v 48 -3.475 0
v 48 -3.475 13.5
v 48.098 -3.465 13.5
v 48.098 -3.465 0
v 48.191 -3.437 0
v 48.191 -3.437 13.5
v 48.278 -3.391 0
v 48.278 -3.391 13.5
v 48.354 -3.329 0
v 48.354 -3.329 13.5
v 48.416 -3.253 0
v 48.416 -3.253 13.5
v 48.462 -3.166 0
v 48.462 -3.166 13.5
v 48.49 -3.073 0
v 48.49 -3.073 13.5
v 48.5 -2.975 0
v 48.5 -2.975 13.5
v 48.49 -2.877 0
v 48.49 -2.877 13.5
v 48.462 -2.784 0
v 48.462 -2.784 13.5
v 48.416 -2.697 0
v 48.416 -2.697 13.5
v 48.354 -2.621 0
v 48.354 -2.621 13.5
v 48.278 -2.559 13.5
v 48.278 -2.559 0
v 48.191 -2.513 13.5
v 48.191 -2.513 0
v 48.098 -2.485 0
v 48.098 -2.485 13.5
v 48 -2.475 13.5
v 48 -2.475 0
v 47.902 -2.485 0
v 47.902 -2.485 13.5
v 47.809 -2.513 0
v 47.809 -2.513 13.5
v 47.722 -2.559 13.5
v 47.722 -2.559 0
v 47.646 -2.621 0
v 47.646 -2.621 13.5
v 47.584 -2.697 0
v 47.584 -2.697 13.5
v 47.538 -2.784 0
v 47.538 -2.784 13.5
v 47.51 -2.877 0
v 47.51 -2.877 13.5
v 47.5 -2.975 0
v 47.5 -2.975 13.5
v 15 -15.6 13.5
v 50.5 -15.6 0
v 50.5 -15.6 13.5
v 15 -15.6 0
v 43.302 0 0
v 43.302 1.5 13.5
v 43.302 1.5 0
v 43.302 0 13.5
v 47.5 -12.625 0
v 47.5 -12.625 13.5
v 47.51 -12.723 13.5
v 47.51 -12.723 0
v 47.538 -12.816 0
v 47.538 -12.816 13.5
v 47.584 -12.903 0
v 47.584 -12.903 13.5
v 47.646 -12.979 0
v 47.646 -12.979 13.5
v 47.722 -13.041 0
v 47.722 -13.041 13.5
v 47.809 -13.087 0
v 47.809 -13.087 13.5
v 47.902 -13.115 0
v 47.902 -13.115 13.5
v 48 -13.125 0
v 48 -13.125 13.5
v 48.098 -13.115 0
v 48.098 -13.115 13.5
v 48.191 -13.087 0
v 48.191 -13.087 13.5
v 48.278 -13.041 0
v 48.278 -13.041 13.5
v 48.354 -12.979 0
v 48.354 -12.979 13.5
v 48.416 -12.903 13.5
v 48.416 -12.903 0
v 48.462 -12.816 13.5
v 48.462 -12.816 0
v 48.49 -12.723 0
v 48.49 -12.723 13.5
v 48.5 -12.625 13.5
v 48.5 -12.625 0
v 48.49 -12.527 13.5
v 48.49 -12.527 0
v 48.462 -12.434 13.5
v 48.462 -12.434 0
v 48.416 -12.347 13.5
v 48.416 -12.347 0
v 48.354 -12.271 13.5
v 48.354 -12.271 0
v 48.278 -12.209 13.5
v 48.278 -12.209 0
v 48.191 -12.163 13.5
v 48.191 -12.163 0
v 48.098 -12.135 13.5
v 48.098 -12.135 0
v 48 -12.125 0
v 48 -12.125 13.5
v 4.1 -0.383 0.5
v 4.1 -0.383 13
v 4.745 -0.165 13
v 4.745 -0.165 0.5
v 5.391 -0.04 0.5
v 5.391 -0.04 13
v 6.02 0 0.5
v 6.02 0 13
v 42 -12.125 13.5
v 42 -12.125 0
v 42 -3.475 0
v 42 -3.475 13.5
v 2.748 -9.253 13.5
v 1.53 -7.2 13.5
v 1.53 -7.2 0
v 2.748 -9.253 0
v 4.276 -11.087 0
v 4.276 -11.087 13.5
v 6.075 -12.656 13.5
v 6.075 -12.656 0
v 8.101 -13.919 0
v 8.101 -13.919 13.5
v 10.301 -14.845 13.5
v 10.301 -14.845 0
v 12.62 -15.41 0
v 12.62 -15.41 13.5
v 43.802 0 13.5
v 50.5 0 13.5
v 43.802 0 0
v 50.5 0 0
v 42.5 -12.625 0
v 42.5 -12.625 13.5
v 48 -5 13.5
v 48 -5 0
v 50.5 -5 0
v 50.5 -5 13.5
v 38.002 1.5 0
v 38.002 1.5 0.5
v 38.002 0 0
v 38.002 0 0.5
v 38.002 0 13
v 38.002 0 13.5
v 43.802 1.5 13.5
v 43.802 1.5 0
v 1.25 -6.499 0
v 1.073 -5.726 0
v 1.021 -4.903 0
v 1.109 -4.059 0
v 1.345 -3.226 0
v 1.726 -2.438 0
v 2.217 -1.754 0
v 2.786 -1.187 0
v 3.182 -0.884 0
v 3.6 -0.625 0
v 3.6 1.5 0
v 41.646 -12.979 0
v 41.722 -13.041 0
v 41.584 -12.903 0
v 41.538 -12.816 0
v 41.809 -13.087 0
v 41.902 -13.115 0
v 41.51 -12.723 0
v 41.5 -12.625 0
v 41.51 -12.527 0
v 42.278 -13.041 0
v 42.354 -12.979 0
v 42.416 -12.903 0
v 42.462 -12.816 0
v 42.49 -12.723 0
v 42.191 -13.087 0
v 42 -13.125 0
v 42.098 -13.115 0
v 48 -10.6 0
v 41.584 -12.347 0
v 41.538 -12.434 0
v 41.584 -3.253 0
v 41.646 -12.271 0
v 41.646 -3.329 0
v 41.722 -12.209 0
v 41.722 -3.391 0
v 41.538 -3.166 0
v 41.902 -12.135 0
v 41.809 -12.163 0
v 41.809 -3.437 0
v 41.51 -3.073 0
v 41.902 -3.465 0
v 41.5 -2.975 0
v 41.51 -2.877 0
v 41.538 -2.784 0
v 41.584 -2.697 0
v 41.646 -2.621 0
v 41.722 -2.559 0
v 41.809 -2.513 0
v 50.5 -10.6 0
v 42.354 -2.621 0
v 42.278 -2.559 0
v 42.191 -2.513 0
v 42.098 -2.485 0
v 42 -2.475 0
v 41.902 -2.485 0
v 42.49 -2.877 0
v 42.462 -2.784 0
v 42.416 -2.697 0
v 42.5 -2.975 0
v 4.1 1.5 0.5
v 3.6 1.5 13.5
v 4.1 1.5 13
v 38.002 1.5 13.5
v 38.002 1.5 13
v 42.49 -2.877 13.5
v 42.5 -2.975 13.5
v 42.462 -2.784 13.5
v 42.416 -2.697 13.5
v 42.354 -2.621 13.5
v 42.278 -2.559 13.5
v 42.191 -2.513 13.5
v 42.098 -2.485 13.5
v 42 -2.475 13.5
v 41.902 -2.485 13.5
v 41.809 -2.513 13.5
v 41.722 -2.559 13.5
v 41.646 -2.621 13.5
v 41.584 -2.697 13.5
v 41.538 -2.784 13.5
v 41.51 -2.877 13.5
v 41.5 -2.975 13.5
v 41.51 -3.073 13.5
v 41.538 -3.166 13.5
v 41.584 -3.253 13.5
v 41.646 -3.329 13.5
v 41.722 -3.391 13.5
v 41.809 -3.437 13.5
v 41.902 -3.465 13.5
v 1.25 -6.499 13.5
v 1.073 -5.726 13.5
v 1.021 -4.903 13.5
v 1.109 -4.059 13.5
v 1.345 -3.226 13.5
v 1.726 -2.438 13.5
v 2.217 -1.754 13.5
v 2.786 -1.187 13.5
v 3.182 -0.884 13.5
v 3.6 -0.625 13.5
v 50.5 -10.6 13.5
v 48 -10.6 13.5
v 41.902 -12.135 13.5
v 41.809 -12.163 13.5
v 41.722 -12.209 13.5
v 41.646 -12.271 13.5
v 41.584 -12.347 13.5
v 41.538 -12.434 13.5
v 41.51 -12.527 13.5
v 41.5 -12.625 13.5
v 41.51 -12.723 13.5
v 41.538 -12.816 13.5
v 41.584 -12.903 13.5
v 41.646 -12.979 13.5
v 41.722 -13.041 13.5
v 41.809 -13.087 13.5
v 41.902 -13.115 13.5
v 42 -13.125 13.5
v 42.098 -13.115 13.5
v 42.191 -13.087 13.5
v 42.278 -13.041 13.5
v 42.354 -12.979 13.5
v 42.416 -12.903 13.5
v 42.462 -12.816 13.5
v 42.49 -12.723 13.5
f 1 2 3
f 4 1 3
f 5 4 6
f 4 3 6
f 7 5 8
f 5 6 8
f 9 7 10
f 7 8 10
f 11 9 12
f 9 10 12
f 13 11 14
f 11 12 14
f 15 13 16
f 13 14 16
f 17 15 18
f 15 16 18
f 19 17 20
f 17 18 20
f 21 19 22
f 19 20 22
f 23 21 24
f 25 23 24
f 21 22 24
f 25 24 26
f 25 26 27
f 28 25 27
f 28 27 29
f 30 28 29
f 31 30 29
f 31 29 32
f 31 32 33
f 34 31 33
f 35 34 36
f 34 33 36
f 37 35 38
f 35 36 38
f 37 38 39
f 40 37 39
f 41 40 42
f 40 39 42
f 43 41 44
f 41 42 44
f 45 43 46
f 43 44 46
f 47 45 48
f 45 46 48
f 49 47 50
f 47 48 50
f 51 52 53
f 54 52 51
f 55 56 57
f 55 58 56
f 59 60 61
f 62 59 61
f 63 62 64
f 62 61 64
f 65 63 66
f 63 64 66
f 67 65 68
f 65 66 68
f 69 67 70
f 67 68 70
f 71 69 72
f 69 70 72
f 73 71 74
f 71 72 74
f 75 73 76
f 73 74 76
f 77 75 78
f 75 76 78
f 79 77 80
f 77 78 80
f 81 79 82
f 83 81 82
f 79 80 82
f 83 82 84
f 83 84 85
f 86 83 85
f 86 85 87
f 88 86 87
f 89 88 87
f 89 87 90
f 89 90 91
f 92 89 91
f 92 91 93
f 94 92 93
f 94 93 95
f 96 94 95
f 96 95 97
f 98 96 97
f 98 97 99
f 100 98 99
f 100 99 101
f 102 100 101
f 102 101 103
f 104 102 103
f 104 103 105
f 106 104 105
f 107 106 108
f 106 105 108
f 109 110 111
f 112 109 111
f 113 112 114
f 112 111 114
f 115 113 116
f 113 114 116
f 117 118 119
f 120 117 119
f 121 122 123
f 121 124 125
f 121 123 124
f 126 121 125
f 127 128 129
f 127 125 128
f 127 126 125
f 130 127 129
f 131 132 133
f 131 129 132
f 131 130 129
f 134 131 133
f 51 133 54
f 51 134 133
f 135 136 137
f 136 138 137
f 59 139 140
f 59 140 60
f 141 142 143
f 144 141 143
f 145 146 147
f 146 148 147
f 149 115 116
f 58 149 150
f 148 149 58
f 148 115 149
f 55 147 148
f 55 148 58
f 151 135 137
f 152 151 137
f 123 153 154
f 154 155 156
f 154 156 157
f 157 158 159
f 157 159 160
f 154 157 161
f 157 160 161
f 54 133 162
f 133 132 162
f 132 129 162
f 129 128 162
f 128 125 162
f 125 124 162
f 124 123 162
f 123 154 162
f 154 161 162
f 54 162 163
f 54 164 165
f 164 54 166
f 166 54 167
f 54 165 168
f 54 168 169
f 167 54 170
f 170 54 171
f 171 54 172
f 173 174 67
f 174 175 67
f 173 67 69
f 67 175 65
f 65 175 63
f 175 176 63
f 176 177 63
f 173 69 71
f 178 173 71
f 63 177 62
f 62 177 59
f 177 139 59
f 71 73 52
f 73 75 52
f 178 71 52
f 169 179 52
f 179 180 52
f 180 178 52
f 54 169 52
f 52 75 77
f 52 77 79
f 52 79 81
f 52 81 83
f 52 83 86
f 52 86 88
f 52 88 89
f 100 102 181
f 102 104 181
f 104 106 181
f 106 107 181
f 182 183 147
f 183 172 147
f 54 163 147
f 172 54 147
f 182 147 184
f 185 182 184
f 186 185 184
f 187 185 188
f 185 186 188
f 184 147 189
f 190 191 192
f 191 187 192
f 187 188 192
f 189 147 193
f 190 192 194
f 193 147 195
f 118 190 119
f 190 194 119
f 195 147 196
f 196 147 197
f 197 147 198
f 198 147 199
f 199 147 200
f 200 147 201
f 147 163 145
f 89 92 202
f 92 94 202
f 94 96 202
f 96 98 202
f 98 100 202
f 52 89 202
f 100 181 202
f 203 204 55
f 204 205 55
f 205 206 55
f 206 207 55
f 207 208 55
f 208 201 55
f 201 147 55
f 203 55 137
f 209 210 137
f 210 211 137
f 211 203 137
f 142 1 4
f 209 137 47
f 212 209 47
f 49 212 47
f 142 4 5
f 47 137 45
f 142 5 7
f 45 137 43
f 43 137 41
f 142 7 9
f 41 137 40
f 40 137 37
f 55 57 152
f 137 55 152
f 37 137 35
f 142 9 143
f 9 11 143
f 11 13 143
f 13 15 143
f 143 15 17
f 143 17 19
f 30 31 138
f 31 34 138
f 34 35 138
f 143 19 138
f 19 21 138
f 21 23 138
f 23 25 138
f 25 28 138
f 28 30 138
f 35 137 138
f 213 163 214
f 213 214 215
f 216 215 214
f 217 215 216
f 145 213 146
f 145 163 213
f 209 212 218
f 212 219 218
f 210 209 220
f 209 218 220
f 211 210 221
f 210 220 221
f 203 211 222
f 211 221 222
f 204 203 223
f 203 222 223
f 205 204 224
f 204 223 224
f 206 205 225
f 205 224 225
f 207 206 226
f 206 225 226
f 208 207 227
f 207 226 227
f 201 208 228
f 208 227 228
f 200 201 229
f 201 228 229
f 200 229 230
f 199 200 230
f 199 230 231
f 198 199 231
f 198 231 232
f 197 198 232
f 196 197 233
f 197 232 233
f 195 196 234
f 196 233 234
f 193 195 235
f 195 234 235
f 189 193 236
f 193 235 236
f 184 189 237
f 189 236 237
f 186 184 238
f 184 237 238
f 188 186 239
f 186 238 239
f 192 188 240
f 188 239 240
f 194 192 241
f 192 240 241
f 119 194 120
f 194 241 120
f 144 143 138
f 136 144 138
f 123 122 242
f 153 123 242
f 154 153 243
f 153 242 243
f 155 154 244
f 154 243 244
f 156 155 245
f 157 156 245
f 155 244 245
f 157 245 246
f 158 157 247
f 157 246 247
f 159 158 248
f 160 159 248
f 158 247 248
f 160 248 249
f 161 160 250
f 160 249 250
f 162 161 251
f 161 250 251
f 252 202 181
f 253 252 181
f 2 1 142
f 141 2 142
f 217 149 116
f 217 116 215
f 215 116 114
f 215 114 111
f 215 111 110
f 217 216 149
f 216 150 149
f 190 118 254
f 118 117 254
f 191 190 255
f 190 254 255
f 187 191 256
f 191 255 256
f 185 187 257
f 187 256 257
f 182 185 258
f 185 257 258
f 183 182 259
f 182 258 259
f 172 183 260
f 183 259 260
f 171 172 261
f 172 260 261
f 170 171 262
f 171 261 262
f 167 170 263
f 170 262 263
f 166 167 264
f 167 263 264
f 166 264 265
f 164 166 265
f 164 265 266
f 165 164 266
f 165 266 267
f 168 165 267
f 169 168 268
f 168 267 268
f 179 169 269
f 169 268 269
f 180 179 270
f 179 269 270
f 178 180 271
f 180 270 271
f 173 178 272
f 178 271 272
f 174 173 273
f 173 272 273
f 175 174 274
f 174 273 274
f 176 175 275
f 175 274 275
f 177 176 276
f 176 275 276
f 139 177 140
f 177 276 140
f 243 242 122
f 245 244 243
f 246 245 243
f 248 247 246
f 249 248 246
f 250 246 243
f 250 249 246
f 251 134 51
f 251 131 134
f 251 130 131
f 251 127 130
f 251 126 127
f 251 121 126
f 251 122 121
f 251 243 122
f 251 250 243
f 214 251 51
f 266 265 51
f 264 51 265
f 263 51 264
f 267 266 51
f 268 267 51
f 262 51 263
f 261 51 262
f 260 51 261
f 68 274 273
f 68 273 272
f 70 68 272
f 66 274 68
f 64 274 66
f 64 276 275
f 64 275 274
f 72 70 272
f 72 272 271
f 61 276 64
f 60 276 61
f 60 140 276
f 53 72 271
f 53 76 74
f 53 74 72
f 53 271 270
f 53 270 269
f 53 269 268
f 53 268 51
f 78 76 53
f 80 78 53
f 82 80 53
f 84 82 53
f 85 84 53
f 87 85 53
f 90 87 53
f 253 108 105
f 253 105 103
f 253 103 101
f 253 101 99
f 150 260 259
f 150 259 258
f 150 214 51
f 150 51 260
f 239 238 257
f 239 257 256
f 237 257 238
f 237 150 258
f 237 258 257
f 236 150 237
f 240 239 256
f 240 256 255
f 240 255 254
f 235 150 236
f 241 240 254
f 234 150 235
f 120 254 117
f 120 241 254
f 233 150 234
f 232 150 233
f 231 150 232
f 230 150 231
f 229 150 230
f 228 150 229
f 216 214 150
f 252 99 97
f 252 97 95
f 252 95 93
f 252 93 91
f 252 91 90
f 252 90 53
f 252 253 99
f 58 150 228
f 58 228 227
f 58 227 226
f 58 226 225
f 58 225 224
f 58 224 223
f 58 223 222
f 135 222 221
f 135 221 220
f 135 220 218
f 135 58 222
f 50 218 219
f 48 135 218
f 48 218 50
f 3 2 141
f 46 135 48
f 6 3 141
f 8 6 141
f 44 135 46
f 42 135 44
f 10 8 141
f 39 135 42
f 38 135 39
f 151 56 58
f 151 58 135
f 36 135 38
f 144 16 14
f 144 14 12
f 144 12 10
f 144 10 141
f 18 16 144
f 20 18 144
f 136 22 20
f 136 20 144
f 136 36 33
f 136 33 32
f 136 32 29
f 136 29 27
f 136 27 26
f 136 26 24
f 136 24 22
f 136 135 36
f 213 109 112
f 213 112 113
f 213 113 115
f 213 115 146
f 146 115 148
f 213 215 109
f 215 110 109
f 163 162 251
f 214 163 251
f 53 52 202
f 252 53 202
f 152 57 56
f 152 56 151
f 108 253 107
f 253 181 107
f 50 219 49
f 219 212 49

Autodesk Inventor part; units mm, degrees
ref_plane "YZ Plane" through (0, 0, 0) normal (1, 0, 0) x (0, 1, 0)
ref_plane "XZ Plane" through (0, 0, 0) normal (0, 1, 0) x (-1, 0, 0)
ref_plane "XY Plane" through (0, 0, 0) normal (0, 0, 1) x (1, 0, 0)
sketch "Sketch5" plane through (0, 0, 0) normal (0, 0, 1) x (1, 0, 0)
  line L0 (50.5, -15.6) -> (50.5, -10.6)
  line L1 (50.5, -10.6) -> (48, -10.6)
  line L2 (48, -10.6) -> (48, -12.625)
  line L3 (42, -12.625) -> (42, -2.975)
  line L4 (48, -2.975) -> (48, -5)
  line L5 (48, -5) -> (50.5, -5)
  line L6 (50.5, -5) -> (50.5, 0)
  line L7 (50.5, 0) -> (5.8, 0)
  line L8 (42, -2.975) -> (48, -2.975)
  line L9 (42, -12.625) -> (48, -12.625)
  line L10 (50.5, -15.6) -> (5.8, -15.6)
  line L11 (5.8, -15.6) -> (0, -15.6)
  line L12 (0, -15.6) -> (0, 0)
  line L13 (0, 0) -> (7.8, 0)
  line L14 (40.5, 0) -> (40.5, -15.6)
  line L15 (39.5, -15.6) -> (39.5, 0)
  line L16 (0, -45.1294) -> (0, -34.3361)
  line L17 (0, -34.3361) -> (38.5, -34.3361)
  line L18 (38.5, -34.3361) -> (38.5, -45.1294)
  line L19 (38.5, -45.1294) -> (0, -45.1294)
  line L20 (38.5, -42.4105) -> (39.5, -42.4105)
  line L21 (39.5, -42.4105) -> (39.5, -38.1261)
  line L22 (39.5, -38.1261) -> (38.5, -38.1261)
  line L23 (39.5, -42.4105) -> (39.5, -49.5786)
  line L24 (39.5, -49.5786) -> (45, -49.5786)
  line L25 (45, -49.5786) -> (45, -34.3361)
  line L26 (45, -34.3361) -> (39.5, -34.3361)
  line L27 (39.5, -34.3361) -> (39.5, -38.1261)
  point P0 (7.8, 0)
  point P1 (39, -42.4105)
  dimension "d41" = 6
  dimension "d48" = 42
  dimension "d50" = 2.5
  dimension "d63" = 44.7
  dimension "d71" = 0
  dimension "d87" = 5.6
  dimension "d88" = 9.65
  dimension "d97" = 15.6
  dimension "d122" = 1.5
  dimension "d123" = 1
  dimension "d124" = 39.5
  dimension "d125" = 38.5
  dimension "d127" = 1
  dimension "d128" = 5.5
extrude "Extrusion2" add sketch "Sketch5" along normal blind 13.5 contours L10 L14 L7 L6 L5 L4 L8 L3 L9 L2 L1 L0 | L10 L15 L7 L14 | L10 L11 L12 L13 L7 L15
fillet "Fillet2" radius 15 1 edges at (0, -15.6, 6.75)
sketch "Sketch11" plane through (0, 0, 13.5) normal (0, 0, 1) x (1, 0, 0)
  line L0 (42, -2.975) -> (48, -2.975) projected
  circle A0 centre (42, -2.975) radius 0.5
  line L1 (42, -12.625) -> (42, -2.975) projected
  circle A1 centre (42, -12.625) radius 0.5
  line L2 (48, -12.625) -> (42, -12.625) projected
  circle A2 centre (48, -12.625) radius 0.5
  line L3 (48, -2.975) -> (48, -5) projected
  circle A3 centre (48, -2.975) radius 0.5
  point P0 (0, 0)
  dimension "d99" = 1
  dimension "d100" = 1
  dimension "d101" = 1
  dimension "d102" = 1
extrude "Extrusion7" cut sketch "Sketch11" against normal through all
fillet "Rundung3" radius 5 1 edges at (0, 0, 6.75)
sketch "Skizze17" plane through (50.5, 0, 13.5) normal (0, 1, 0) x (1, 0, 0)
  line L0 (-48.97, 13.5) -> (-35.5, 13.5) projected
  line L1 (-46.9, 0) -> (-46.4, 0)
  line L2 (-46.4, 0) -> (-46.4, 13.5)
  line L3 (-46.4, 13.5) -> (-46.9, 13.5)
  line L4 (-46.9, 13.5) -> (-46.9, 0)
  line L5 (-44.48, 0) -> (-49.48, 0) projected
  line L6 (-44.48, 0) -> (-44.48, 13.5) projected
  point P0 (-50.5, 13.5)
  point P1 (-48.97, 0)
  point P2 (-46.65, 0)
  dimension "d140" = 0.5
  dimension "d150" = 0
  dimension "d163" = 1.92
extrude "Extrusion12" add sketch "Skizze17" along normal mid plane 3 contours L0 L2 L1 L4
sketch "Skizze18" plane through (50.5, 0, 13.5) normal (0, 1, 0) x (1, 0, 0)
  line L0 (-6.6976, 0) -> (-6.6976, 13.5)
  line L1 (-46.4, 0) -> (-46.4, 13.5) projected
  line L2 (0, 13.5) -> (-44.48, 13.5) projected
  line L3 (0, 0) -> (-44.48, 0) projected
  line L4 (-7.1976, 0) -> (-7.1976, 13.5)
  line L5 (-7.1976, 13.5) -> (-6.6976, 13.5)
  line L6 (-7.1976, 0) -> (-6.6976, 0)
  point P0 (-50.5, 13.5)
  dimension "d160" = 0.5
extrude "Extrusion13" add sketch "Skizze18" along normal blind 1.5
sketch "Skizze19" plane through (6.02, 0, 13.5) normal (0, 1, 0) x (1, 0, 0)
  line L0 (44.48, 13.5) -> (0, 13.5) projected
  line L1 (-2.3517, 13) -> (37.6723, 13)
  line L2 (37.6723, 13) -> (37.6723, 13.5)
  line L3 (37.6723, 13.5) -> (-2.3517, 13.5)
  line L4 (-2.3517, 13.5) -> (-2.3517, 13)
  line L5 (-1.92, 0) -> (-1.92, 13.5) projected
  point P0 (-6.02, 13.5)
  point P1 (3.0824, 14.25)
  point P2 (16.6541, 14.25)
  point P3 (24.4324, 14.25)
  dimension "d159" = 0.5
  dimension "d162" = 0
extrude "Extrusion14" add sketch "Skizze19" along normal mid plane 3
sketch "Skizze20" plane through (6.02, 0, 13.5) normal (0, 1, 0) x (1, 0, 0)
  line L0 (36.7824, 14.5) -> (36.7824, 0) projected
  line L1 (-2.2337, 0) -> (36.7824, 0)
  line L2 (36.7824, 0) -> (36.7824, 0.5)
  line L3 (36.7824, 0.5) -> (-2.2337, 0.5)
  line L4 (-2.2337, 0.5) -> (-2.2337, 0)
  line L5 (37.2824, 0) -> (0, 0) projected
  point P0 (-6.02, 13.5)
  point P1 (36.7824, 14)
  dimension "d137" = 0
  dimension "d139" = 0.5
extrude "Extrusion15" add sketch "Skizze20" along normal mid plane 3
sketch "Skizze21" plane through (6.02, 0, 0.5) normal (0, 1, 0) x (1, 0, 0)
  line L0 (8.98, 0.5) -> (44.48, 0.5) projected
  line L1 (31.9824, 3.6397) -> (37.2824, 3.6397)
  line L2 (37.2824, 3.6397) -> (37.2824, -19.4506)
  line L3 (37.2824, -19.4506) -> (31.9824, -19.4506)
  line L4 (31.9824, -19.4506) -> (31.9824, 3.6397)
  line L5 (36.7824, 0) -> (36.7824, -13.5) projected
  line L6 (37.2824, 0) -> (37.2824, -13) projected
  point P0 (-6.02, 0.5)
  point P1 (37.2824, -0.5)
  dimension "d152" = 5.3
  dimension "d161" = 0
extrude "Extrusion16" cut sketch "Skizze21" along normal blind 3
equation "\"l1\" = 8"
properties part number "Maria_Greifer_3D-Druck"
